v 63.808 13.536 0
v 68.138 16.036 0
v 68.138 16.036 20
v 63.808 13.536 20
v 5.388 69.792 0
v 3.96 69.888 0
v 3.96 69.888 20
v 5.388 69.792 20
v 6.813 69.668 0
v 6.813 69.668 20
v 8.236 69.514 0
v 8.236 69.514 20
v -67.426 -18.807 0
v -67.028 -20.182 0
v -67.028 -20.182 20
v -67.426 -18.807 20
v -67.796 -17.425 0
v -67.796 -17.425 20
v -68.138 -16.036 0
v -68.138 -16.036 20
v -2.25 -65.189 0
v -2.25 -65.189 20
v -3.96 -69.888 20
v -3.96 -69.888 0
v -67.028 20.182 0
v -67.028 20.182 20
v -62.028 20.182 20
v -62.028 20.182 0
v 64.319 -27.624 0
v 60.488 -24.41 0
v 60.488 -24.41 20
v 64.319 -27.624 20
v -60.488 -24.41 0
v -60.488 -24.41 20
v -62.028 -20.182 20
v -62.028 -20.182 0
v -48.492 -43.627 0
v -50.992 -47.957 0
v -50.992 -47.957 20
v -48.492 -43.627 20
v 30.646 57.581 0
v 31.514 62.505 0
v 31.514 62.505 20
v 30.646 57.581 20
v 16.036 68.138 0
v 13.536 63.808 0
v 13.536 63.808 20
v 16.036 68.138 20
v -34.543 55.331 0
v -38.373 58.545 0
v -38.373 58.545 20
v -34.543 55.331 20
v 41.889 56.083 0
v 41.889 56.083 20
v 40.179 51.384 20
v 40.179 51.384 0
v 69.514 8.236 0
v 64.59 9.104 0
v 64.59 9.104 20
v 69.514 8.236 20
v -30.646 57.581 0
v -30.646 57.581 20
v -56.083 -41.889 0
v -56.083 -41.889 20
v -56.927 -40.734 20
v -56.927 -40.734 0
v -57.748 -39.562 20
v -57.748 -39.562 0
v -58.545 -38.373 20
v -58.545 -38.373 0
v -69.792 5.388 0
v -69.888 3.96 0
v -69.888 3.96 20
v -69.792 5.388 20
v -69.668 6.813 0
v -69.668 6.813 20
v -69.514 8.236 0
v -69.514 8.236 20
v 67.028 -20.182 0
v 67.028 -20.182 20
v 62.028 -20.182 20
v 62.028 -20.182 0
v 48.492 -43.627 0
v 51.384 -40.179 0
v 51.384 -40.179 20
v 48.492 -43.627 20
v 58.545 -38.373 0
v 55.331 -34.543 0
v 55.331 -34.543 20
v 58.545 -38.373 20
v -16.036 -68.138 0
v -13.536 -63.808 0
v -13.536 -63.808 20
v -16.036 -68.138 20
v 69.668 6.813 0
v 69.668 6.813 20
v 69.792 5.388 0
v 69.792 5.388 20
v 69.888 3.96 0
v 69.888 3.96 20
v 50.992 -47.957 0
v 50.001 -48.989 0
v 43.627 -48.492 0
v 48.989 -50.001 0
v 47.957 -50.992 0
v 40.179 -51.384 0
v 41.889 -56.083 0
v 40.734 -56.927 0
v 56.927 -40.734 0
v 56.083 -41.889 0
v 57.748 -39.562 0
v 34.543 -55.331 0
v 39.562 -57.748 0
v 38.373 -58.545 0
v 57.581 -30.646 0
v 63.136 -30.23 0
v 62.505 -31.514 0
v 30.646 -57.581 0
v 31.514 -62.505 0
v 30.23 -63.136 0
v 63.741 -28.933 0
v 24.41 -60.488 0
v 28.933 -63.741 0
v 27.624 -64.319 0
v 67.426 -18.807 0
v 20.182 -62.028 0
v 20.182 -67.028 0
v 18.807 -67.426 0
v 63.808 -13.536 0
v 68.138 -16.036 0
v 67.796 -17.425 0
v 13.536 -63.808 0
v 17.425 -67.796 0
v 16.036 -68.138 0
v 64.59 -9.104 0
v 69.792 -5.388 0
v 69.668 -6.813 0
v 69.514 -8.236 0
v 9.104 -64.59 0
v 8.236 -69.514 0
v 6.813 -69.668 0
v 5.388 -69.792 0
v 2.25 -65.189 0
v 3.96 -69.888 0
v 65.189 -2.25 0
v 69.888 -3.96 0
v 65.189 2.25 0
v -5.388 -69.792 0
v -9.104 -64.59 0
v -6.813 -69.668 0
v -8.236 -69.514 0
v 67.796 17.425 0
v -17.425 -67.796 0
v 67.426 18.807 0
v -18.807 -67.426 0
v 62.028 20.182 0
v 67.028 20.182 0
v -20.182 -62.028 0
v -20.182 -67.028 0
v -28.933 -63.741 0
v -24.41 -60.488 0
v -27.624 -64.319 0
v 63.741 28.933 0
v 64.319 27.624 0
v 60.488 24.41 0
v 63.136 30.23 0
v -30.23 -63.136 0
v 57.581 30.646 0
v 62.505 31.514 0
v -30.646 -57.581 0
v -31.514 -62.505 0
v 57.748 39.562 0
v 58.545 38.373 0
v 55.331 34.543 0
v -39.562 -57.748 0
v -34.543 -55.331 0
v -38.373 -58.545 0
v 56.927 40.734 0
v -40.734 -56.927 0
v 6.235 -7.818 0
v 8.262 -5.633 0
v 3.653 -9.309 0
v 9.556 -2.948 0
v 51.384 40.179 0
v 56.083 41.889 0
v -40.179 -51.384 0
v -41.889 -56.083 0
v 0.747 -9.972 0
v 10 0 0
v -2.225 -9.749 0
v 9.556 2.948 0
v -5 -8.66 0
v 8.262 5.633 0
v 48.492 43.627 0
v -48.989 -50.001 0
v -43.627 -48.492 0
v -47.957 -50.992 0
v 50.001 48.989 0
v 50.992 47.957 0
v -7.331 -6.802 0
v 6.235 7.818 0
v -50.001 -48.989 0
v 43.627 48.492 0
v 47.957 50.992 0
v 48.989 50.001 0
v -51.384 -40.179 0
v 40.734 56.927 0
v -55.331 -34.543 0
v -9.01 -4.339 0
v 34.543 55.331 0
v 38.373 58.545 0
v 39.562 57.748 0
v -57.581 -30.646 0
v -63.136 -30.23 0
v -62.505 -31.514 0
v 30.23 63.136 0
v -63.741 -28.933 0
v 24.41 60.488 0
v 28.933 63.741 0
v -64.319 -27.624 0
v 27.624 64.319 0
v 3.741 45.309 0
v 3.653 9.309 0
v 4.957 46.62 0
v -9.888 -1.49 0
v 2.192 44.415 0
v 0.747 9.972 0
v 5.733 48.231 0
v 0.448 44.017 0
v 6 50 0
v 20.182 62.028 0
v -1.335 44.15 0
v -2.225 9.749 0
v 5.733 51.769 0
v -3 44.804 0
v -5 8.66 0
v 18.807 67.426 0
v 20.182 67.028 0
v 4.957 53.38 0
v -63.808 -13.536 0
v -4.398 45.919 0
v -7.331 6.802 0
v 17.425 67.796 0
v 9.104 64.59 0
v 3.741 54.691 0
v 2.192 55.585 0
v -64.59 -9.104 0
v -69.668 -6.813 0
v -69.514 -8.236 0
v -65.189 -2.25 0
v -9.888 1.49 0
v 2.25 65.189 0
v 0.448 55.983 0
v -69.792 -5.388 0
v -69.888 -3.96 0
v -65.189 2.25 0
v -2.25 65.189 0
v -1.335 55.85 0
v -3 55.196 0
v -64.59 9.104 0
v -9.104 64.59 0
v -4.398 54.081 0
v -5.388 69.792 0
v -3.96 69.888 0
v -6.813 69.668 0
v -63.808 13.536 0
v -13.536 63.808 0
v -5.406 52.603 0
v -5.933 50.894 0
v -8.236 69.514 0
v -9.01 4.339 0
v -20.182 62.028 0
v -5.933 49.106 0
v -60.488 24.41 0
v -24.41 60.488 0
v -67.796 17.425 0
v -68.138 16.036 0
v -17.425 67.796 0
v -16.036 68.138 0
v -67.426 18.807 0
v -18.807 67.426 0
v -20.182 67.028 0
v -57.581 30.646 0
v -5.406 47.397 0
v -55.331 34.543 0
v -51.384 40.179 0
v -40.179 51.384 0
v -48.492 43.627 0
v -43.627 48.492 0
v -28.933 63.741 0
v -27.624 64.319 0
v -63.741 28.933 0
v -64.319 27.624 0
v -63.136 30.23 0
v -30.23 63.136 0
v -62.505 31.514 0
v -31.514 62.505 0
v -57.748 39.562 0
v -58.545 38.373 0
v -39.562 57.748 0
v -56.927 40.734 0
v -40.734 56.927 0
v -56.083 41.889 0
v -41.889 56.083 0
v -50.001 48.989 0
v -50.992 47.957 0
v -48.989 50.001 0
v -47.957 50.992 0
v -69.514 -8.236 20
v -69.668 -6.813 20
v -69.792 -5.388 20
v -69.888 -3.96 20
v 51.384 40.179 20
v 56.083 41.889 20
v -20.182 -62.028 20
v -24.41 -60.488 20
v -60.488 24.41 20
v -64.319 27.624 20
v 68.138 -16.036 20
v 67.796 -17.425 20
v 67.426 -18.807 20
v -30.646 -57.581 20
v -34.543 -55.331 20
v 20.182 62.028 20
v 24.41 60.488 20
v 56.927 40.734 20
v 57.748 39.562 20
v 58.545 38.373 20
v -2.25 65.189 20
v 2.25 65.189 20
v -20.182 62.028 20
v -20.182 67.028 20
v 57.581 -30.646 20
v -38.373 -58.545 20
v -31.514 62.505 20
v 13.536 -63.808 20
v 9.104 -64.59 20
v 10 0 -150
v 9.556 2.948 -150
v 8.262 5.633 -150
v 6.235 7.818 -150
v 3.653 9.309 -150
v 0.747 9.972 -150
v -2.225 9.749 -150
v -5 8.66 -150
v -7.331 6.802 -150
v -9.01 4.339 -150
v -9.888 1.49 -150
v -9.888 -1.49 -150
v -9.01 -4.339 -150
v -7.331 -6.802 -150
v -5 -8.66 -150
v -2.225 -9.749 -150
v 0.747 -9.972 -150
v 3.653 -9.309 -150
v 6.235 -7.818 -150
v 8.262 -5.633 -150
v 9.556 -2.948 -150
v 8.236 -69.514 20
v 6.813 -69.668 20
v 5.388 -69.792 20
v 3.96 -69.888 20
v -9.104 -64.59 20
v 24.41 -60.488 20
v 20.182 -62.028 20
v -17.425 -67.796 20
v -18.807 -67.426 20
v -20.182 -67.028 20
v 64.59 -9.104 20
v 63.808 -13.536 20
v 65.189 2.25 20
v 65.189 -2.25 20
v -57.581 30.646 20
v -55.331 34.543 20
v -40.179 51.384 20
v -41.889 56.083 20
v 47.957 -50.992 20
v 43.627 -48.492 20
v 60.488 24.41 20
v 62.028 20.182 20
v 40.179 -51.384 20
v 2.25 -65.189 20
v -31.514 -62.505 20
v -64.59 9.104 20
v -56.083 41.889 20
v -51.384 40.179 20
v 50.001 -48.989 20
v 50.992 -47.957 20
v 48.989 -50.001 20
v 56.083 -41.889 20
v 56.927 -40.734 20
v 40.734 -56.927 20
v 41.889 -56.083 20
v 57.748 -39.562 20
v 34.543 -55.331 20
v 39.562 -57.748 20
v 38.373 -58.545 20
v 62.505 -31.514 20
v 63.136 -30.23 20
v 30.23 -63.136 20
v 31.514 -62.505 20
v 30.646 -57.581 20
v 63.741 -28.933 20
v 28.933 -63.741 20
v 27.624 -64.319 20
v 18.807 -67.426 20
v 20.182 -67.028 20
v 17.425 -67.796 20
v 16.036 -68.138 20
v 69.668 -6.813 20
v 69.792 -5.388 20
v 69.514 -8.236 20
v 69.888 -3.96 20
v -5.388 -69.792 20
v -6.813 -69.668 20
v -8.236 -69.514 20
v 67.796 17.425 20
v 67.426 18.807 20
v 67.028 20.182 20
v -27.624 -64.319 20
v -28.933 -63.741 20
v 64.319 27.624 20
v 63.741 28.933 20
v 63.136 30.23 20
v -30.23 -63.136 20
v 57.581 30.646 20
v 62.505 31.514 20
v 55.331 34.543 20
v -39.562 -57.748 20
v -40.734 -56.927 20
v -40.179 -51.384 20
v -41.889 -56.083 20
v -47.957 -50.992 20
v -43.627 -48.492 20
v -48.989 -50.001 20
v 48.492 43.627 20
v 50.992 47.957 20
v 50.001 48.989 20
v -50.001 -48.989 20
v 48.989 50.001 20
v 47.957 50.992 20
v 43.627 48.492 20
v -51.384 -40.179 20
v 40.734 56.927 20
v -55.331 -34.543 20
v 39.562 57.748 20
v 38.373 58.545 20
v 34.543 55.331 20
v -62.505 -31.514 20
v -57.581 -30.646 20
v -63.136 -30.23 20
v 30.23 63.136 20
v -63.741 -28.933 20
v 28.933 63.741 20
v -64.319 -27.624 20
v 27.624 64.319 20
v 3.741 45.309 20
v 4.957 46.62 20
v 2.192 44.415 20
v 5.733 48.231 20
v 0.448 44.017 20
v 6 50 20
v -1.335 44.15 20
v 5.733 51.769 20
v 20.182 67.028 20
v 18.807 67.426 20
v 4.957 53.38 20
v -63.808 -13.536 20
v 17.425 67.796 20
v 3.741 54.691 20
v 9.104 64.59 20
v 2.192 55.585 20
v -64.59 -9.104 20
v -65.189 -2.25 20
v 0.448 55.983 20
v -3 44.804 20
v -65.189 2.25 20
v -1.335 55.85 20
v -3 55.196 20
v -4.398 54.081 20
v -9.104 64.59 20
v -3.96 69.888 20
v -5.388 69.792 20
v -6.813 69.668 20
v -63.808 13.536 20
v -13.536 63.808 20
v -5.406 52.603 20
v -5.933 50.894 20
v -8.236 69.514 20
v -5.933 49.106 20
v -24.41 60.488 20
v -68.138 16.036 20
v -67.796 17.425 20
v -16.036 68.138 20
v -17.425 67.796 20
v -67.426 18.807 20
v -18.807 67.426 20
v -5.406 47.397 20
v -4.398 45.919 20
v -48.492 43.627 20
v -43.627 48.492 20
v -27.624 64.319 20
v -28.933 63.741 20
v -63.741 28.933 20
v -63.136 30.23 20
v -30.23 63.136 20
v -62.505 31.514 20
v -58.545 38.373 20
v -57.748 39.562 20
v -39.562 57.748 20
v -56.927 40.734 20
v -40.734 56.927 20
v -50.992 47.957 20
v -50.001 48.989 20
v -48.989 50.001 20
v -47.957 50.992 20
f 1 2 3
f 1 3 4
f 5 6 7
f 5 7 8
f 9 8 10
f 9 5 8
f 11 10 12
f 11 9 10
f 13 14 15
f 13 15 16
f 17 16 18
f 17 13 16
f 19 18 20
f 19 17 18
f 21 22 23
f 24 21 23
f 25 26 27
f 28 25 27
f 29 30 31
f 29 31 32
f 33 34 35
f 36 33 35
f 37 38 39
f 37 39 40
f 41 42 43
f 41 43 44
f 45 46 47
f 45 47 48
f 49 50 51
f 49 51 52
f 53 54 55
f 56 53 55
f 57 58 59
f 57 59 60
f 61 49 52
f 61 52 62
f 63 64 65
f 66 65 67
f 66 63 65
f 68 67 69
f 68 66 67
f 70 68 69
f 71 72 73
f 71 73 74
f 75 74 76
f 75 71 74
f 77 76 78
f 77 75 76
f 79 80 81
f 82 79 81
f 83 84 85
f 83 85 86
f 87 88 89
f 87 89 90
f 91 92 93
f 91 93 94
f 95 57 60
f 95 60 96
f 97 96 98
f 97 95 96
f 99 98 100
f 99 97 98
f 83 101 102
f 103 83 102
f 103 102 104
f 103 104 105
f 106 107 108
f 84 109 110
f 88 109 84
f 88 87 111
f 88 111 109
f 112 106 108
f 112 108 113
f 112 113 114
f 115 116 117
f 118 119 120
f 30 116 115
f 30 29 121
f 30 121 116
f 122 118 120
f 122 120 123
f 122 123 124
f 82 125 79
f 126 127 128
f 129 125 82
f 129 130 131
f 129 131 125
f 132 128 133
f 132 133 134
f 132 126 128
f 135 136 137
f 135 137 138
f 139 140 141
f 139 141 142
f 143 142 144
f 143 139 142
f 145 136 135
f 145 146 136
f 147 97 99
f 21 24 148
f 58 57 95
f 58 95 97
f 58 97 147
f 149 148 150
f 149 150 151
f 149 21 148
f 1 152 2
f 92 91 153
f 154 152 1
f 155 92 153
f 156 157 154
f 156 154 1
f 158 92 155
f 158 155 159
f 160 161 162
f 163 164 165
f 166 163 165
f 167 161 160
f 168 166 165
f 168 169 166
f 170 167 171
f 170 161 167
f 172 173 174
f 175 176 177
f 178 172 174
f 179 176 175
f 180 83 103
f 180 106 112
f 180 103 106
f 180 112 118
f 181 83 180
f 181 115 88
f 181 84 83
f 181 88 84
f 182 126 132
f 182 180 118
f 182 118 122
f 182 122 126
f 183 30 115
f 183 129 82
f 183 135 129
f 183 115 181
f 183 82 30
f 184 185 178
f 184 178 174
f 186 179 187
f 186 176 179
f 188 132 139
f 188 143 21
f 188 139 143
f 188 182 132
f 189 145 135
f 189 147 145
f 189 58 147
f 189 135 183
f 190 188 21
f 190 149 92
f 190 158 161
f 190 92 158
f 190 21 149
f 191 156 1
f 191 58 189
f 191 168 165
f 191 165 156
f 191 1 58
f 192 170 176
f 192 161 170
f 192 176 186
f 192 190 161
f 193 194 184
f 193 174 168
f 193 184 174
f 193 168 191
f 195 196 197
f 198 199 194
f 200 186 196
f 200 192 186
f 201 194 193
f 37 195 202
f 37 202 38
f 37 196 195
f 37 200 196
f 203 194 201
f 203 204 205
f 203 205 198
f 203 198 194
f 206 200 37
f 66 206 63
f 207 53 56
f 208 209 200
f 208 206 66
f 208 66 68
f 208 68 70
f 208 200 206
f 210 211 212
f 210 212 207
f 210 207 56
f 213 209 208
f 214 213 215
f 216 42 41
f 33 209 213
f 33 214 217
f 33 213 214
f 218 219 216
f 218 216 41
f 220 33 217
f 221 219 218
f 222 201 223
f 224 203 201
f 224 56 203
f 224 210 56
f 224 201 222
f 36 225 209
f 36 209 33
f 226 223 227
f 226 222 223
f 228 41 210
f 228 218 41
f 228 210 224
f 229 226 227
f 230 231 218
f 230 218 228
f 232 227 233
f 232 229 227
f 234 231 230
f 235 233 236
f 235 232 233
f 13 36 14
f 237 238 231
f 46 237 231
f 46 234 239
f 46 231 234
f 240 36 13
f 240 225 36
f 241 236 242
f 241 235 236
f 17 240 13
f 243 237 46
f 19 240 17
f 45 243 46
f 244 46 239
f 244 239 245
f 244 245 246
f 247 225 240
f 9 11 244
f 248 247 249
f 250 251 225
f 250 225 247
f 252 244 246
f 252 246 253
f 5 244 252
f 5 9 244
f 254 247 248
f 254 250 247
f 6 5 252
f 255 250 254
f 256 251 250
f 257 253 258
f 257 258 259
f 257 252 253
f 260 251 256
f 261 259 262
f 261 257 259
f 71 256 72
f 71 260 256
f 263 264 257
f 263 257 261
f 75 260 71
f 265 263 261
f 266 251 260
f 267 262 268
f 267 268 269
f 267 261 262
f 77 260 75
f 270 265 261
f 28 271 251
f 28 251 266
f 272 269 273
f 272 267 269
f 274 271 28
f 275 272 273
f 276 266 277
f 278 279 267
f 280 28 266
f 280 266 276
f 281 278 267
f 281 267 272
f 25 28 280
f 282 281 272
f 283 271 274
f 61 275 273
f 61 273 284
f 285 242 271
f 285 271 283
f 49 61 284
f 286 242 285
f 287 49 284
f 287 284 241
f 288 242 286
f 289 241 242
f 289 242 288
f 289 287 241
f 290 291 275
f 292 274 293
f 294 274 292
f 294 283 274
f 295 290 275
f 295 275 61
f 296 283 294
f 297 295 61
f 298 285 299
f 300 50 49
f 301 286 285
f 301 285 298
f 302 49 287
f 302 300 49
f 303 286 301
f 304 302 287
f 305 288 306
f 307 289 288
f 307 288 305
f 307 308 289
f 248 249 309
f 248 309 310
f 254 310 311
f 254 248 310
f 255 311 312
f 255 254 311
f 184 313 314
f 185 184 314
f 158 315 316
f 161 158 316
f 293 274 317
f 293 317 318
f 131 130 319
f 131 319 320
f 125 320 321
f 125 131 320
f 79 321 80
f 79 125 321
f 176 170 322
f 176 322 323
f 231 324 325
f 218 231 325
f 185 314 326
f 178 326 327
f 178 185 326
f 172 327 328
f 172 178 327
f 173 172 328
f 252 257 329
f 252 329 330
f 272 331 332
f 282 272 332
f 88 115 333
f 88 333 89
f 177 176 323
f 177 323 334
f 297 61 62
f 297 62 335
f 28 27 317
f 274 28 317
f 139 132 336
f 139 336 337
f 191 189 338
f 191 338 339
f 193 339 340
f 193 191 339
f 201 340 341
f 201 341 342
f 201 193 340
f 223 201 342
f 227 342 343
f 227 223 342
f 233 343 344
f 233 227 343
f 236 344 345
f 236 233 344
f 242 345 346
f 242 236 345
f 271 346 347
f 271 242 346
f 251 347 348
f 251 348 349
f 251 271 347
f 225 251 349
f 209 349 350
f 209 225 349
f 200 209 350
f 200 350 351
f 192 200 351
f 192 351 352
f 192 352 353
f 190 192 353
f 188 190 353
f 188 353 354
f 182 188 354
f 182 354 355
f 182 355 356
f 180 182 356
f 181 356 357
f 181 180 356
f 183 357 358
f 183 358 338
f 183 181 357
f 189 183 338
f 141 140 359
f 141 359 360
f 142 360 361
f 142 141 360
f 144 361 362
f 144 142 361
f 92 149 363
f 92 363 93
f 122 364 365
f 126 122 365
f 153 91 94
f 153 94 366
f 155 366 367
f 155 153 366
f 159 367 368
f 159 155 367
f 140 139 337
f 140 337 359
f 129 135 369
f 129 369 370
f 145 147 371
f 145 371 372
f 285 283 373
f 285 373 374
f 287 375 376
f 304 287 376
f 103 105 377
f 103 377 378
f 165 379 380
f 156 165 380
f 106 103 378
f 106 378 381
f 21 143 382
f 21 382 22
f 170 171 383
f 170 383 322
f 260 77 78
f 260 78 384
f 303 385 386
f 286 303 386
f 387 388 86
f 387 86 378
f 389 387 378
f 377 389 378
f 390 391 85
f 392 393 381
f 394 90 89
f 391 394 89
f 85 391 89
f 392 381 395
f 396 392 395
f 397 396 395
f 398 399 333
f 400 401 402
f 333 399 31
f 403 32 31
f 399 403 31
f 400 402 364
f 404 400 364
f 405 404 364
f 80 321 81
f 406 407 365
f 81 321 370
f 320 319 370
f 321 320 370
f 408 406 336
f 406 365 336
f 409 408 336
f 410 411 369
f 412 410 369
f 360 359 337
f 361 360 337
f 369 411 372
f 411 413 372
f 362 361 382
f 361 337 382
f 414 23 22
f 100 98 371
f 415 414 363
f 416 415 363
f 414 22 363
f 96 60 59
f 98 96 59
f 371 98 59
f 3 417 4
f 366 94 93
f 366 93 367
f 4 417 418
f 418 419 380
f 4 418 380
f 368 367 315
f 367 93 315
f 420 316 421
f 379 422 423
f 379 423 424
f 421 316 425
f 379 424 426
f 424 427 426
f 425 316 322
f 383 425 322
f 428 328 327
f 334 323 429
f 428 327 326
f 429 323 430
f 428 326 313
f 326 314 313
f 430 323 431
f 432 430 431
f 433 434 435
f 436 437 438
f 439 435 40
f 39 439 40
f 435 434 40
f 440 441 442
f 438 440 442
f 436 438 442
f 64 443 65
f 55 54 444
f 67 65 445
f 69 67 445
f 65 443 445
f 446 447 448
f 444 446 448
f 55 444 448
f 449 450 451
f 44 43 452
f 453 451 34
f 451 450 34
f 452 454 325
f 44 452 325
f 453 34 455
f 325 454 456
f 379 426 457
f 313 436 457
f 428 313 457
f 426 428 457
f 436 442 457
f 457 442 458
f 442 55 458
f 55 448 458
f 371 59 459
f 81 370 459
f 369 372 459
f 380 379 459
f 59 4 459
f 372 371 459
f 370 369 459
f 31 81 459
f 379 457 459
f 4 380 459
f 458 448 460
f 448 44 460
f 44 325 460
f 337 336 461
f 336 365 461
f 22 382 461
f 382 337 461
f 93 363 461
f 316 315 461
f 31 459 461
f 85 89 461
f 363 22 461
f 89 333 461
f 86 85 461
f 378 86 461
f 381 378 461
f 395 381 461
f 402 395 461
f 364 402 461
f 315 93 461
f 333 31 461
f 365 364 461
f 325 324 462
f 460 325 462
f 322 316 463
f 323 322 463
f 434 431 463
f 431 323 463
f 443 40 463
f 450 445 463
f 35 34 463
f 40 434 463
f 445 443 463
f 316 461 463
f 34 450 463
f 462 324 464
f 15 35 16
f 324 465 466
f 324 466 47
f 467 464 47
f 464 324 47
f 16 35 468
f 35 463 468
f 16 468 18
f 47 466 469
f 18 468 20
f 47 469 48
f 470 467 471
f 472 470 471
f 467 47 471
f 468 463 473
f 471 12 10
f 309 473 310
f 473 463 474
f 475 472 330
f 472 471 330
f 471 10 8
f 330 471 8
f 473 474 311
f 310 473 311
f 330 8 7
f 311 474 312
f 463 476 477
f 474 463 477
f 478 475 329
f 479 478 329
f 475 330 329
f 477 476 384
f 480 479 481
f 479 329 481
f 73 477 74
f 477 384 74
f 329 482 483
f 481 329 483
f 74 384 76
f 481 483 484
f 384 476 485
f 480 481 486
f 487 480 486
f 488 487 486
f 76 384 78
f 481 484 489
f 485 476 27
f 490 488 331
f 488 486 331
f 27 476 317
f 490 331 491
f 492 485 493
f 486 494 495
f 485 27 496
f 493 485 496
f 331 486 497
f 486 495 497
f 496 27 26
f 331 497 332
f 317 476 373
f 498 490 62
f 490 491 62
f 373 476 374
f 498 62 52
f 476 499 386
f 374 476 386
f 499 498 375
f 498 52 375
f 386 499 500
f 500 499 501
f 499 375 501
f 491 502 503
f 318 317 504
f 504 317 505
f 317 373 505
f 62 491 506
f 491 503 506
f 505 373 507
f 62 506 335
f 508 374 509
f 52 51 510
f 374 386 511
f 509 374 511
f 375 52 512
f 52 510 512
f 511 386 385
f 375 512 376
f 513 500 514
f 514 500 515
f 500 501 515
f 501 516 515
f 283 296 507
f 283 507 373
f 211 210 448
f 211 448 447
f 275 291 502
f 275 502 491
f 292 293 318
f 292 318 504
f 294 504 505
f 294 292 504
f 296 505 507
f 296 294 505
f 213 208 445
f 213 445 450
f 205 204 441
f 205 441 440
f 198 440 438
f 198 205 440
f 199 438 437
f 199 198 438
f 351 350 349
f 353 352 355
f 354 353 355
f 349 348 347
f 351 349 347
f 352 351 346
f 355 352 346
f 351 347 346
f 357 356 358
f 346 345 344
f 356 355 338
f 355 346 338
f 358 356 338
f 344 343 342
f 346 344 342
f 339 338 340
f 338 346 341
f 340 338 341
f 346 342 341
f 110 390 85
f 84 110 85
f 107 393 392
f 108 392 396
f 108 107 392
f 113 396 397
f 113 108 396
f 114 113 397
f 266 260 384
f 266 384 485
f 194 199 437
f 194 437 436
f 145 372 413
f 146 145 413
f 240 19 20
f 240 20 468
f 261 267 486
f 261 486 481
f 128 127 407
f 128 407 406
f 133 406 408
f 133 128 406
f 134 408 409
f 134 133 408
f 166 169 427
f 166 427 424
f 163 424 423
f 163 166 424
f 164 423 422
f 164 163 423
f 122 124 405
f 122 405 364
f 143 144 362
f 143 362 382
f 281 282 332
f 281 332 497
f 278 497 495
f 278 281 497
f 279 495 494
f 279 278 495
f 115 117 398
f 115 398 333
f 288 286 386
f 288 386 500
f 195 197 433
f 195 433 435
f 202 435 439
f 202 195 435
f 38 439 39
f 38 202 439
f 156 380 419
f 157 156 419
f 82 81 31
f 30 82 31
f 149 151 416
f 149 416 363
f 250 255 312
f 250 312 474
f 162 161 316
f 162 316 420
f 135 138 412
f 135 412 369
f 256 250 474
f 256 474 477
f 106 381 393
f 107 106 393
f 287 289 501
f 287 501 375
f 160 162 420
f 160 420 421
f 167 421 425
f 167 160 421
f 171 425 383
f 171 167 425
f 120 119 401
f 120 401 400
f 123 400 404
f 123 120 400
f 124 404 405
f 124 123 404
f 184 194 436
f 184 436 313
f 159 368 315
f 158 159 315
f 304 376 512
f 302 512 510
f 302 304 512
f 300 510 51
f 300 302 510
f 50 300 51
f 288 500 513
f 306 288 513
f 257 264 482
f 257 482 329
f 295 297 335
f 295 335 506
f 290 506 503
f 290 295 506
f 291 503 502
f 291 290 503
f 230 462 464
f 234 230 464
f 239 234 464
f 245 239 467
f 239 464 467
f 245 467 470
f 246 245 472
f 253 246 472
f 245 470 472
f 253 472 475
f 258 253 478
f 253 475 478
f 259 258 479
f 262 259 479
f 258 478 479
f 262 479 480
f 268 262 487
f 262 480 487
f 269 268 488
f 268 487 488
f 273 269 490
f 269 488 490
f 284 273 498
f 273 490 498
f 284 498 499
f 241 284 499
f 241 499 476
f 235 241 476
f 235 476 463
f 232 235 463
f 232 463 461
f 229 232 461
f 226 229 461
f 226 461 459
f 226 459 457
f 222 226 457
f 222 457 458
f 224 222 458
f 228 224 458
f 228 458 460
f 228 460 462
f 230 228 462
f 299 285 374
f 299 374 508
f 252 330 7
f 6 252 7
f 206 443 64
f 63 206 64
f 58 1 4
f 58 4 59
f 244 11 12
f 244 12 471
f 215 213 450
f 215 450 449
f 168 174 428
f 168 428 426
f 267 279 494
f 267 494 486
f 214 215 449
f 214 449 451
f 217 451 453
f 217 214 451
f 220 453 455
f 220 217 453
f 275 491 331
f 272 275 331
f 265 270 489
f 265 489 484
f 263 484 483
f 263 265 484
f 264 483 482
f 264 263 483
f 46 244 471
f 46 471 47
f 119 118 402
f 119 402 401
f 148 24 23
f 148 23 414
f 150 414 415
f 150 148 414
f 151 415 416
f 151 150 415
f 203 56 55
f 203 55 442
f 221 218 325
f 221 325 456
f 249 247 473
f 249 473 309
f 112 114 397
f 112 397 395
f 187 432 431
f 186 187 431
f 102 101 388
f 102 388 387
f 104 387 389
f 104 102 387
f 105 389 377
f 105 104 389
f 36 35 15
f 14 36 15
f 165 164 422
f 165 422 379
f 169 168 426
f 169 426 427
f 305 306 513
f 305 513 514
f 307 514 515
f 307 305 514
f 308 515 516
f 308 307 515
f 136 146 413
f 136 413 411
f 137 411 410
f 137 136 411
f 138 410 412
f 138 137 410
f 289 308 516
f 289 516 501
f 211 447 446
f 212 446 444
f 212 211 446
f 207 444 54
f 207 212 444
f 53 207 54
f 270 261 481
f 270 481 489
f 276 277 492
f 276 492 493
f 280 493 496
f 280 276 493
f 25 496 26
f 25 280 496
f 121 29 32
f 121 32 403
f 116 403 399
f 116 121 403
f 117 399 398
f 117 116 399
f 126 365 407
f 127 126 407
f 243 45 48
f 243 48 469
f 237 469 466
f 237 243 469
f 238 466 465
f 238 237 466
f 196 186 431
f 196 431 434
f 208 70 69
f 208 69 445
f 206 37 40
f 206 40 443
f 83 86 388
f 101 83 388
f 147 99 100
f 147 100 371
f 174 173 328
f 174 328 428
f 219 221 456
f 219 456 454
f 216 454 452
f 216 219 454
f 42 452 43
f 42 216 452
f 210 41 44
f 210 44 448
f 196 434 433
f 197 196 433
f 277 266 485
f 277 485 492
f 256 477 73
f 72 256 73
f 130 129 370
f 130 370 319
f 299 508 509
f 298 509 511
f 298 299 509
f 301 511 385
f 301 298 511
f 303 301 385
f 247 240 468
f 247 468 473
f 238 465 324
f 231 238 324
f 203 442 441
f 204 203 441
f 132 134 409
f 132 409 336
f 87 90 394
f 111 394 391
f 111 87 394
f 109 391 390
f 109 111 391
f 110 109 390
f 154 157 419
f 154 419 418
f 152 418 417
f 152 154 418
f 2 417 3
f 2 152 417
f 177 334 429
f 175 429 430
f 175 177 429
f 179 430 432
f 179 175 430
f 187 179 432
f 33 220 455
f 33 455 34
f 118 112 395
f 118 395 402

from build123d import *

# Parameters (mm, degrees)
BOSS_EXTRUDE1_DEPTH = 20
SKETCH2_R           = 10
BOSS_EXTRUDE2_DEPTH = 150
SKETCH3_R           = 6
CUT_EXTRUDE1_DEPTH  = 197.643421463


with BuildPart() as part:
    # Sketch1 → Boss-Extrude1 (new body)
    with BuildSketch(Plane.XY):
        with BuildLine():
            Line((-3.960100717, 69.887893103), (-2.25, 65.189429999))
            Line((-2.25, 65.189429999), (2.25, 65.189429999))
            Line((2.25, 65.189429999), (3.960100717, 69.887893103))
            ThreePointArc((3.960100717, 69.887893103), (6.100901992, 69.733628866), (8.23596739, 69.513803242))
            Line((8.23596739, 69.513803242), (9.104208278, 64.589764477))
            Line((9.104208278, 64.589764477), (13.535843167, 63.808347677))
            Line((13.535843167, 63.808347677), (16.035843167, 68.138474696))
            ThreePointArc((16.035843167, 68.138474696), (18.117333157, 67.61480784), (20.181789795, 67.027571645))
            Line((20.181789795, 67.027571645), (20.181789795, 62.027571645))
            Line((20.181789795, 62.027571645), (24.410406588, 60.488481))
            Line((24.410406588, 60.488481), (27.624344637, 64.318703216))
            ThreePointArc((27.624344637, 64.318703216), (29.583278322, 63.441545093), (31.514398729, 62.504741202))
            Line((31.514398729, 62.504741202), (30.646157841, 57.580702437))
            Line((30.646157841, 57.580702437), (34.543272158, 55.330702437))
            Line((34.543272158, 55.330702437), (38.373494373, 58.544640485))
            ThreePointArc((38.373494373, 58.544640485), (40.150350545, 57.3406431), (41.889458605, 56.082735826))
            Line((41.889458605, 56.082735826), (40.179357889, 51.384272722))
            Line((40.179357889, 51.384272722), (43.626557883, 48.491728479))
            Line((43.626557883, 48.491728479), (47.956684902, 50.991728479))
            ThreePointArc((47.956684902, 50.991728479), (49.497474683, 49.497474683), (50.991728479, 47.956684902))
            Line((50.991728479, 47.956684902), (48.491728479, 43.626557883))
            Line((48.491728479, 43.626557883), (51.384272722, 40.179357889))
            Line((51.384272722, 40.179357889), (56.082735826, 41.889458605))
            ThreePointArc((56.082735826, 41.889458605), (57.3406431, 40.150350545), (58.544640485, 38.373494373))
            Line((58.544640485, 38.373494373), (55.330702437, 34.543272158))
            Line((55.330702437, 34.543272158), (57.580702437, 30.646157841))
            Line((57.580702437, 30.646157841), (62.504741202, 31.514398729))
            ThreePointArc((62.504741202, 31.514398729), (63.441545093, 29.583278322), (64.318703216, 27.624344637))
            Line((64.318703216, 27.624344637), (60.488481, 24.410406588))
            Line((60.488481, 24.410406588), (62.027571645, 20.181789795))
            Line((62.027571645, 20.181789795), (67.027571645, 20.181789795))
            ThreePointArc((67.027571645, 20.181789795), (67.61480784, 18.117333157), (68.138474696, 16.035843167))
            Line((68.138474696, 16.035843167), (63.808347677, 13.535843167))
            Line((63.808347677, 13.535843167), (64.589764477, 9.104208278))
            Line((64.589764477, 9.104208278), (69.513803242, 8.23596739))
            ThreePointArc((69.513803242, 8.23596739), (69.733628866, 6.100901992), (69.887893103, 3.960100717))
            Line((69.887893103, 3.960100717), (65.189429999, 2.25))
            Line((65.189429999, 2.25), (65.189429999, -2.25))
            Line((65.189429999, -2.25), (69.887893103, -3.960100717))
            ThreePointArc((69.887893103, -3.960100717), (69.733628866, -6.100901992), (69.513803242, -8.23596739))
            Line((69.513803242, -8.23596739), (64.589764477, -9.104208278))
            Line((64.589764477, -9.104208278), (63.808347677, -13.535843167))
            Line((63.808347677, -13.535843167), (68.138474696, -16.035843167))
            ThreePointArc((68.138474696, -16.035843167), (67.61480784, -18.117333157), (67.027571645, -20.181789795))
            Line((67.027571645, -20.181789795), (62.027571645, -20.181789795))
            Line((62.027571645, -20.181789795), (60.488481, -24.410406588))
            Line((60.488481, -24.410406588), (64.318703216, -27.624344637))
            ThreePointArc((64.318703216, -27.624344637), (63.441545093, -29.583278322), (62.504741202, -31.514398729))
            Line((62.504741202, -31.514398729), (57.580702437, -30.646157841))
            Line((57.580702437, -30.646157841), (55.330702437, -34.543272158))
            Line((55.330702437, -34.543272158), (58.544640485, -38.373494373))
            ThreePointArc((58.544640485, -38.373494373), (57.3406431, -40.150350545), (56.082735826, -41.889458605))
            Line((56.082735826, -41.889458605), (51.384272722, -40.179357889))
            Line((51.384272722, -40.179357889), (48.491728479, -43.626557883))
            Line((48.491728479, -43.626557883), (50.991728479, -47.956684902))
            ThreePointArc((50.991728479, -47.956684902), (49.497474683, -49.497474683), (47.956684902, -50.991728479))
            Line((47.956684902, -50.991728479), (43.626557883, -48.491728479))
            Line((43.626557883, -48.491728479), (40.179357889, -51.384272722))
            Line((40.179357889, -51.384272722), (41.889458605, -56.082735826))
            ThreePointArc((41.889458605, -56.082735826), (40.150350545, -57.3406431), (38.373494373, -58.544640485))
            Line((38.373494373, -58.544640485), (34.543272158, -55.330702437))
            Line((34.543272158, -55.330702437), (30.646157841, -57.580702437))
            Line((30.646157841, -57.580702437), (31.514398729, -62.504741202))
            ThreePointArc((31.514398729, -62.504741202), (29.583278322, -63.441545093), (27.624344637, -64.318703216))
            Line((27.624344637, -64.318703216), (24.410406588, -60.488481))
            Line((24.410406588, -60.488481), (20.181789795, -62.027571645))
            Line((20.181789795, -62.027571645), (20.181789795, -67.027571645))
            ThreePointArc((20.181789795, -67.027571645), (18.117333157, -67.61480784), (16.035843167, -68.138474696))
            Line((16.035843167, -68.138474696), (13.535843167, -63.808347677))
            Line((13.535843167, -63.808347677), (9.104208278, -64.589764477))
            Line((9.104208278, -64.589764477), (8.23596739, -69.513803242))
            ThreePointArc((8.23596739, -69.513803242), (6.100901992, -69.733628866), (3.960100717, -69.887893103))
            Line((3.960100717, -69.887893103), (2.25, -65.189429999))
            Line((2.25, -65.189429999), (-2.25, -65.189429999))
            Line((-2.25, -65.189429999), (-3.960100717, -69.887893103))
            ThreePointArc((-3.960100717, -69.887893103), (-6.100901992, -69.733628866), (-8.23596739, -69.513803242))
            Line((-8.23596739, -69.513803242), (-9.104208278, -64.589764477))
            Line((-9.104208278, -64.589764477), (-13.535843167, -63.808347677))
            Line((-13.535843167, -63.808347677), (-16.035843167, -68.138474696))
            ThreePointArc((-16.035843167, -68.138474696), (-18.117333157, -67.61480784), (-20.181789795, -67.027571645))
            Line((-20.181789795, -67.027571645), (-20.181789795, -62.027571645))
            Line((-20.181789795, -62.027571645), (-24.410406588, -60.488481))
            Line((-24.410406588, -60.488481), (-27.624344637, -64.318703216))
            ThreePointArc((-27.624344637, -64.318703216), (-29.583278322, -63.441545093), (-31.514398729, -62.504741202))
            Line((-31.514398729, -62.504741202), (-30.646157841, -57.580702437))
            Line((-30.646157841, -57.580702437), (-34.543272158, -55.330702437))
            Line((-34.543272158, -55.330702437), (-38.373494373, -58.544640485))
            ThreePointArc((-38.373494373, -58.544640485), (-40.150350545, -57.3406431), (-41.889458605, -56.082735826))
            Line((-41.889458605, -56.082735826), (-40.179357889, -51.384272722))
            Line((-40.179357889, -51.384272722), (-43.626557883, -48.491728479))
            Line((-43.626557883, -48.491728479), (-47.956684902, -50.991728479))
            ThreePointArc((-47.956684902, -50.991728479), (-49.497474683, -49.497474683), (-50.991728479, -47.956684902))
            Line((-50.991728479, -47.956684902), (-48.491728479, -43.626557883))
            Line((-48.491728479, -43.626557883), (-51.384272722, -40.179357889))
            Line((-51.384272722, -40.179357889), (-56.082735826, -41.889458605))
            ThreePointArc((-56.082735826, -41.889458605), (-57.3406431, -40.150350545), (-58.544640485, -38.373494373))
            Line((-58.544640485, -38.373494373), (-55.330702437, -34.543272158))
            Line((-55.330702437, -34.543272158), (-57.580702437, -30.646157841))
            Line((-57.580702437, -30.646157841), (-62.504741202, -31.514398729))
            ThreePointArc((-62.504741202, -31.514398729), (-63.441545093, -29.583278322), (-64.318703216, -27.624344637))
            Line((-64.318703216, -27.624344637), (-60.488481, -24.410406588))
            Line((-60.488481, -24.410406588), (-62.027571645, -20.181789795))
            Line((-62.027571645, -20.181789795), (-67.027571645, -20.181789795))
            ThreePointArc((-67.027571645, -20.181789795), (-67.61480784, -18.117333157), (-68.138474696, -16.035843167))
            Line((-68.138474696, -16.035843167), (-63.808347677, -13.535843167))
            Line((-63.808347677, -13.535843167), (-64.589764477, -9.104208278))
            Line((-64.589764477, -9.104208278), (-69.513803242, -8.23596739))
            ThreePointArc((-69.513803242, -8.23596739), (-69.733628866, -6.100901992), (-69.887893103, -3.960100717))
            Line((-69.887893103, -3.960100717), (-65.189429999, -2.25))
            Line((-65.189429999, -2.25), (-65.189429999, 2.25))
            Line((-65.189429999, 2.25), (-69.887893103, 3.960100717))
            ThreePointArc((-69.887893103, 3.960100717), (-69.733628866, 6.100901992), (-69.513803242, 8.23596739))
            Line((-69.513803242, 8.23596739), (-64.589764477, 9.104208278))
            Line((-64.589764477, 9.104208278), (-63.808347677, 13.535843167))
            Line((-63.808347677, 13.535843167), (-68.138474696, 16.035843167))
            ThreePointArc((-68.138474696, 16.035843167), (-67.61480784, 18.117333157), (-67.027571645, 20.181789795))
            Line((-67.027571645, 20.181789795), (-62.027571645, 20.181789795))
            Line((-62.027571645, 20.181789795), (-60.488481, 24.410406588))
            Line((-60.488481, 24.410406588), (-64.318703216, 27.624344637))
            ThreePointArc((-64.318703216, 27.624344637), (-63.441545093, 29.583278322), (-62.504741202, 31.514398729))
            Line((-62.504741202, 31.514398729), (-57.580702437, 30.646157841))
            Line((-57.580702437, 30.646157841), (-55.330702437, 34.543272158))
            Line((-55.330702437, 34.543272158), (-58.544640485, 38.373494373))
            ThreePointArc((-58.544640485, 38.373494373), (-57.3406431, 40.150350545), (-56.082735826, 41.889458605))
            Line((-56.082735826, 41.889458605), (-51.384272722, 40.179357889))
            Line((-51.384272722, 40.179357889), (-48.491728479, 43.626557883))
            Line((-48.491728479, 43.626557883), (-50.991728479, 47.956684902))
            ThreePointArc((-50.991728479, 47.956684902), (-49.497474683, 49.497474683), (-47.956684902, 50.991728479))
            Line((-47.956684902, 50.991728479), (-43.626557883, 48.491728479))
            Line((-43.626557883, 48.491728479), (-40.179357889, 51.384272722))
            Line((-40.179357889, 51.384272722), (-41.889458605, 56.082735826))
            ThreePointArc((-41.889458605, 56.082735826), (-40.150350545, 57.3406431), (-38.373494373, 58.544640485))
            Line((-38.373494373, 58.544640485), (-34.543272158, 55.330702437))
            Line((-34.543272158, 55.330702437), (-30.646157841, 57.580702437))
            Line((-30.646157841, 57.580702437), (-31.514398729, 62.504741202))
            ThreePointArc((-31.514398729, 62.504741202), (-29.583278322, 63.441545093), (-27.624344637, 64.318703216))
            Line((-27.624344637, 64.318703216), (-24.410406588, 60.488481))
            Line((-24.410406588, 60.488481), (-20.181789795, 62.027571645))
            Line((-20.181789795, 62.027571645), (-20.181789795, 67.027571645))
            ThreePointArc((-20.181789795, 67.027571645), (-18.117333157, 67.61480784), (-16.035843167, 68.138474696))
            Line((-16.035843167, 68.138474696), (-13.535843167, 63.808347677))
            Line((-13.535843167, 63.808347677), (-9.104208278, 64.589764477))
            Line((-9.104208278, 64.589764477), (-8.23596739, 69.513803242))
            ThreePointArc((-8.23596739, 69.513803242), (-6.100901992, 69.733628866), (-3.960100717, 69.887893103))
        make_face()
    extrude(amount=BOSS_EXTRUDE1_DEPTH)

    # Sketch2 → Boss-Extrude2 (add)
    with BuildSketch(Plane.XY):
        Circle(SKETCH2_R)
    extrude(amount=-BOSS_EXTRUDE2_DEPTH)

    # Sketch3 → Cut-Extrude1 (cut, through all)
    with BuildSketch(Plane.XY.offset(20)):
        with Locations((0, 50)):
            Circle(SKETCH3_R)
    extrude(amount=-CUT_EXTRUDE1_DEPTH, mode=Mode.SUBTRACT)


solid = part.part
